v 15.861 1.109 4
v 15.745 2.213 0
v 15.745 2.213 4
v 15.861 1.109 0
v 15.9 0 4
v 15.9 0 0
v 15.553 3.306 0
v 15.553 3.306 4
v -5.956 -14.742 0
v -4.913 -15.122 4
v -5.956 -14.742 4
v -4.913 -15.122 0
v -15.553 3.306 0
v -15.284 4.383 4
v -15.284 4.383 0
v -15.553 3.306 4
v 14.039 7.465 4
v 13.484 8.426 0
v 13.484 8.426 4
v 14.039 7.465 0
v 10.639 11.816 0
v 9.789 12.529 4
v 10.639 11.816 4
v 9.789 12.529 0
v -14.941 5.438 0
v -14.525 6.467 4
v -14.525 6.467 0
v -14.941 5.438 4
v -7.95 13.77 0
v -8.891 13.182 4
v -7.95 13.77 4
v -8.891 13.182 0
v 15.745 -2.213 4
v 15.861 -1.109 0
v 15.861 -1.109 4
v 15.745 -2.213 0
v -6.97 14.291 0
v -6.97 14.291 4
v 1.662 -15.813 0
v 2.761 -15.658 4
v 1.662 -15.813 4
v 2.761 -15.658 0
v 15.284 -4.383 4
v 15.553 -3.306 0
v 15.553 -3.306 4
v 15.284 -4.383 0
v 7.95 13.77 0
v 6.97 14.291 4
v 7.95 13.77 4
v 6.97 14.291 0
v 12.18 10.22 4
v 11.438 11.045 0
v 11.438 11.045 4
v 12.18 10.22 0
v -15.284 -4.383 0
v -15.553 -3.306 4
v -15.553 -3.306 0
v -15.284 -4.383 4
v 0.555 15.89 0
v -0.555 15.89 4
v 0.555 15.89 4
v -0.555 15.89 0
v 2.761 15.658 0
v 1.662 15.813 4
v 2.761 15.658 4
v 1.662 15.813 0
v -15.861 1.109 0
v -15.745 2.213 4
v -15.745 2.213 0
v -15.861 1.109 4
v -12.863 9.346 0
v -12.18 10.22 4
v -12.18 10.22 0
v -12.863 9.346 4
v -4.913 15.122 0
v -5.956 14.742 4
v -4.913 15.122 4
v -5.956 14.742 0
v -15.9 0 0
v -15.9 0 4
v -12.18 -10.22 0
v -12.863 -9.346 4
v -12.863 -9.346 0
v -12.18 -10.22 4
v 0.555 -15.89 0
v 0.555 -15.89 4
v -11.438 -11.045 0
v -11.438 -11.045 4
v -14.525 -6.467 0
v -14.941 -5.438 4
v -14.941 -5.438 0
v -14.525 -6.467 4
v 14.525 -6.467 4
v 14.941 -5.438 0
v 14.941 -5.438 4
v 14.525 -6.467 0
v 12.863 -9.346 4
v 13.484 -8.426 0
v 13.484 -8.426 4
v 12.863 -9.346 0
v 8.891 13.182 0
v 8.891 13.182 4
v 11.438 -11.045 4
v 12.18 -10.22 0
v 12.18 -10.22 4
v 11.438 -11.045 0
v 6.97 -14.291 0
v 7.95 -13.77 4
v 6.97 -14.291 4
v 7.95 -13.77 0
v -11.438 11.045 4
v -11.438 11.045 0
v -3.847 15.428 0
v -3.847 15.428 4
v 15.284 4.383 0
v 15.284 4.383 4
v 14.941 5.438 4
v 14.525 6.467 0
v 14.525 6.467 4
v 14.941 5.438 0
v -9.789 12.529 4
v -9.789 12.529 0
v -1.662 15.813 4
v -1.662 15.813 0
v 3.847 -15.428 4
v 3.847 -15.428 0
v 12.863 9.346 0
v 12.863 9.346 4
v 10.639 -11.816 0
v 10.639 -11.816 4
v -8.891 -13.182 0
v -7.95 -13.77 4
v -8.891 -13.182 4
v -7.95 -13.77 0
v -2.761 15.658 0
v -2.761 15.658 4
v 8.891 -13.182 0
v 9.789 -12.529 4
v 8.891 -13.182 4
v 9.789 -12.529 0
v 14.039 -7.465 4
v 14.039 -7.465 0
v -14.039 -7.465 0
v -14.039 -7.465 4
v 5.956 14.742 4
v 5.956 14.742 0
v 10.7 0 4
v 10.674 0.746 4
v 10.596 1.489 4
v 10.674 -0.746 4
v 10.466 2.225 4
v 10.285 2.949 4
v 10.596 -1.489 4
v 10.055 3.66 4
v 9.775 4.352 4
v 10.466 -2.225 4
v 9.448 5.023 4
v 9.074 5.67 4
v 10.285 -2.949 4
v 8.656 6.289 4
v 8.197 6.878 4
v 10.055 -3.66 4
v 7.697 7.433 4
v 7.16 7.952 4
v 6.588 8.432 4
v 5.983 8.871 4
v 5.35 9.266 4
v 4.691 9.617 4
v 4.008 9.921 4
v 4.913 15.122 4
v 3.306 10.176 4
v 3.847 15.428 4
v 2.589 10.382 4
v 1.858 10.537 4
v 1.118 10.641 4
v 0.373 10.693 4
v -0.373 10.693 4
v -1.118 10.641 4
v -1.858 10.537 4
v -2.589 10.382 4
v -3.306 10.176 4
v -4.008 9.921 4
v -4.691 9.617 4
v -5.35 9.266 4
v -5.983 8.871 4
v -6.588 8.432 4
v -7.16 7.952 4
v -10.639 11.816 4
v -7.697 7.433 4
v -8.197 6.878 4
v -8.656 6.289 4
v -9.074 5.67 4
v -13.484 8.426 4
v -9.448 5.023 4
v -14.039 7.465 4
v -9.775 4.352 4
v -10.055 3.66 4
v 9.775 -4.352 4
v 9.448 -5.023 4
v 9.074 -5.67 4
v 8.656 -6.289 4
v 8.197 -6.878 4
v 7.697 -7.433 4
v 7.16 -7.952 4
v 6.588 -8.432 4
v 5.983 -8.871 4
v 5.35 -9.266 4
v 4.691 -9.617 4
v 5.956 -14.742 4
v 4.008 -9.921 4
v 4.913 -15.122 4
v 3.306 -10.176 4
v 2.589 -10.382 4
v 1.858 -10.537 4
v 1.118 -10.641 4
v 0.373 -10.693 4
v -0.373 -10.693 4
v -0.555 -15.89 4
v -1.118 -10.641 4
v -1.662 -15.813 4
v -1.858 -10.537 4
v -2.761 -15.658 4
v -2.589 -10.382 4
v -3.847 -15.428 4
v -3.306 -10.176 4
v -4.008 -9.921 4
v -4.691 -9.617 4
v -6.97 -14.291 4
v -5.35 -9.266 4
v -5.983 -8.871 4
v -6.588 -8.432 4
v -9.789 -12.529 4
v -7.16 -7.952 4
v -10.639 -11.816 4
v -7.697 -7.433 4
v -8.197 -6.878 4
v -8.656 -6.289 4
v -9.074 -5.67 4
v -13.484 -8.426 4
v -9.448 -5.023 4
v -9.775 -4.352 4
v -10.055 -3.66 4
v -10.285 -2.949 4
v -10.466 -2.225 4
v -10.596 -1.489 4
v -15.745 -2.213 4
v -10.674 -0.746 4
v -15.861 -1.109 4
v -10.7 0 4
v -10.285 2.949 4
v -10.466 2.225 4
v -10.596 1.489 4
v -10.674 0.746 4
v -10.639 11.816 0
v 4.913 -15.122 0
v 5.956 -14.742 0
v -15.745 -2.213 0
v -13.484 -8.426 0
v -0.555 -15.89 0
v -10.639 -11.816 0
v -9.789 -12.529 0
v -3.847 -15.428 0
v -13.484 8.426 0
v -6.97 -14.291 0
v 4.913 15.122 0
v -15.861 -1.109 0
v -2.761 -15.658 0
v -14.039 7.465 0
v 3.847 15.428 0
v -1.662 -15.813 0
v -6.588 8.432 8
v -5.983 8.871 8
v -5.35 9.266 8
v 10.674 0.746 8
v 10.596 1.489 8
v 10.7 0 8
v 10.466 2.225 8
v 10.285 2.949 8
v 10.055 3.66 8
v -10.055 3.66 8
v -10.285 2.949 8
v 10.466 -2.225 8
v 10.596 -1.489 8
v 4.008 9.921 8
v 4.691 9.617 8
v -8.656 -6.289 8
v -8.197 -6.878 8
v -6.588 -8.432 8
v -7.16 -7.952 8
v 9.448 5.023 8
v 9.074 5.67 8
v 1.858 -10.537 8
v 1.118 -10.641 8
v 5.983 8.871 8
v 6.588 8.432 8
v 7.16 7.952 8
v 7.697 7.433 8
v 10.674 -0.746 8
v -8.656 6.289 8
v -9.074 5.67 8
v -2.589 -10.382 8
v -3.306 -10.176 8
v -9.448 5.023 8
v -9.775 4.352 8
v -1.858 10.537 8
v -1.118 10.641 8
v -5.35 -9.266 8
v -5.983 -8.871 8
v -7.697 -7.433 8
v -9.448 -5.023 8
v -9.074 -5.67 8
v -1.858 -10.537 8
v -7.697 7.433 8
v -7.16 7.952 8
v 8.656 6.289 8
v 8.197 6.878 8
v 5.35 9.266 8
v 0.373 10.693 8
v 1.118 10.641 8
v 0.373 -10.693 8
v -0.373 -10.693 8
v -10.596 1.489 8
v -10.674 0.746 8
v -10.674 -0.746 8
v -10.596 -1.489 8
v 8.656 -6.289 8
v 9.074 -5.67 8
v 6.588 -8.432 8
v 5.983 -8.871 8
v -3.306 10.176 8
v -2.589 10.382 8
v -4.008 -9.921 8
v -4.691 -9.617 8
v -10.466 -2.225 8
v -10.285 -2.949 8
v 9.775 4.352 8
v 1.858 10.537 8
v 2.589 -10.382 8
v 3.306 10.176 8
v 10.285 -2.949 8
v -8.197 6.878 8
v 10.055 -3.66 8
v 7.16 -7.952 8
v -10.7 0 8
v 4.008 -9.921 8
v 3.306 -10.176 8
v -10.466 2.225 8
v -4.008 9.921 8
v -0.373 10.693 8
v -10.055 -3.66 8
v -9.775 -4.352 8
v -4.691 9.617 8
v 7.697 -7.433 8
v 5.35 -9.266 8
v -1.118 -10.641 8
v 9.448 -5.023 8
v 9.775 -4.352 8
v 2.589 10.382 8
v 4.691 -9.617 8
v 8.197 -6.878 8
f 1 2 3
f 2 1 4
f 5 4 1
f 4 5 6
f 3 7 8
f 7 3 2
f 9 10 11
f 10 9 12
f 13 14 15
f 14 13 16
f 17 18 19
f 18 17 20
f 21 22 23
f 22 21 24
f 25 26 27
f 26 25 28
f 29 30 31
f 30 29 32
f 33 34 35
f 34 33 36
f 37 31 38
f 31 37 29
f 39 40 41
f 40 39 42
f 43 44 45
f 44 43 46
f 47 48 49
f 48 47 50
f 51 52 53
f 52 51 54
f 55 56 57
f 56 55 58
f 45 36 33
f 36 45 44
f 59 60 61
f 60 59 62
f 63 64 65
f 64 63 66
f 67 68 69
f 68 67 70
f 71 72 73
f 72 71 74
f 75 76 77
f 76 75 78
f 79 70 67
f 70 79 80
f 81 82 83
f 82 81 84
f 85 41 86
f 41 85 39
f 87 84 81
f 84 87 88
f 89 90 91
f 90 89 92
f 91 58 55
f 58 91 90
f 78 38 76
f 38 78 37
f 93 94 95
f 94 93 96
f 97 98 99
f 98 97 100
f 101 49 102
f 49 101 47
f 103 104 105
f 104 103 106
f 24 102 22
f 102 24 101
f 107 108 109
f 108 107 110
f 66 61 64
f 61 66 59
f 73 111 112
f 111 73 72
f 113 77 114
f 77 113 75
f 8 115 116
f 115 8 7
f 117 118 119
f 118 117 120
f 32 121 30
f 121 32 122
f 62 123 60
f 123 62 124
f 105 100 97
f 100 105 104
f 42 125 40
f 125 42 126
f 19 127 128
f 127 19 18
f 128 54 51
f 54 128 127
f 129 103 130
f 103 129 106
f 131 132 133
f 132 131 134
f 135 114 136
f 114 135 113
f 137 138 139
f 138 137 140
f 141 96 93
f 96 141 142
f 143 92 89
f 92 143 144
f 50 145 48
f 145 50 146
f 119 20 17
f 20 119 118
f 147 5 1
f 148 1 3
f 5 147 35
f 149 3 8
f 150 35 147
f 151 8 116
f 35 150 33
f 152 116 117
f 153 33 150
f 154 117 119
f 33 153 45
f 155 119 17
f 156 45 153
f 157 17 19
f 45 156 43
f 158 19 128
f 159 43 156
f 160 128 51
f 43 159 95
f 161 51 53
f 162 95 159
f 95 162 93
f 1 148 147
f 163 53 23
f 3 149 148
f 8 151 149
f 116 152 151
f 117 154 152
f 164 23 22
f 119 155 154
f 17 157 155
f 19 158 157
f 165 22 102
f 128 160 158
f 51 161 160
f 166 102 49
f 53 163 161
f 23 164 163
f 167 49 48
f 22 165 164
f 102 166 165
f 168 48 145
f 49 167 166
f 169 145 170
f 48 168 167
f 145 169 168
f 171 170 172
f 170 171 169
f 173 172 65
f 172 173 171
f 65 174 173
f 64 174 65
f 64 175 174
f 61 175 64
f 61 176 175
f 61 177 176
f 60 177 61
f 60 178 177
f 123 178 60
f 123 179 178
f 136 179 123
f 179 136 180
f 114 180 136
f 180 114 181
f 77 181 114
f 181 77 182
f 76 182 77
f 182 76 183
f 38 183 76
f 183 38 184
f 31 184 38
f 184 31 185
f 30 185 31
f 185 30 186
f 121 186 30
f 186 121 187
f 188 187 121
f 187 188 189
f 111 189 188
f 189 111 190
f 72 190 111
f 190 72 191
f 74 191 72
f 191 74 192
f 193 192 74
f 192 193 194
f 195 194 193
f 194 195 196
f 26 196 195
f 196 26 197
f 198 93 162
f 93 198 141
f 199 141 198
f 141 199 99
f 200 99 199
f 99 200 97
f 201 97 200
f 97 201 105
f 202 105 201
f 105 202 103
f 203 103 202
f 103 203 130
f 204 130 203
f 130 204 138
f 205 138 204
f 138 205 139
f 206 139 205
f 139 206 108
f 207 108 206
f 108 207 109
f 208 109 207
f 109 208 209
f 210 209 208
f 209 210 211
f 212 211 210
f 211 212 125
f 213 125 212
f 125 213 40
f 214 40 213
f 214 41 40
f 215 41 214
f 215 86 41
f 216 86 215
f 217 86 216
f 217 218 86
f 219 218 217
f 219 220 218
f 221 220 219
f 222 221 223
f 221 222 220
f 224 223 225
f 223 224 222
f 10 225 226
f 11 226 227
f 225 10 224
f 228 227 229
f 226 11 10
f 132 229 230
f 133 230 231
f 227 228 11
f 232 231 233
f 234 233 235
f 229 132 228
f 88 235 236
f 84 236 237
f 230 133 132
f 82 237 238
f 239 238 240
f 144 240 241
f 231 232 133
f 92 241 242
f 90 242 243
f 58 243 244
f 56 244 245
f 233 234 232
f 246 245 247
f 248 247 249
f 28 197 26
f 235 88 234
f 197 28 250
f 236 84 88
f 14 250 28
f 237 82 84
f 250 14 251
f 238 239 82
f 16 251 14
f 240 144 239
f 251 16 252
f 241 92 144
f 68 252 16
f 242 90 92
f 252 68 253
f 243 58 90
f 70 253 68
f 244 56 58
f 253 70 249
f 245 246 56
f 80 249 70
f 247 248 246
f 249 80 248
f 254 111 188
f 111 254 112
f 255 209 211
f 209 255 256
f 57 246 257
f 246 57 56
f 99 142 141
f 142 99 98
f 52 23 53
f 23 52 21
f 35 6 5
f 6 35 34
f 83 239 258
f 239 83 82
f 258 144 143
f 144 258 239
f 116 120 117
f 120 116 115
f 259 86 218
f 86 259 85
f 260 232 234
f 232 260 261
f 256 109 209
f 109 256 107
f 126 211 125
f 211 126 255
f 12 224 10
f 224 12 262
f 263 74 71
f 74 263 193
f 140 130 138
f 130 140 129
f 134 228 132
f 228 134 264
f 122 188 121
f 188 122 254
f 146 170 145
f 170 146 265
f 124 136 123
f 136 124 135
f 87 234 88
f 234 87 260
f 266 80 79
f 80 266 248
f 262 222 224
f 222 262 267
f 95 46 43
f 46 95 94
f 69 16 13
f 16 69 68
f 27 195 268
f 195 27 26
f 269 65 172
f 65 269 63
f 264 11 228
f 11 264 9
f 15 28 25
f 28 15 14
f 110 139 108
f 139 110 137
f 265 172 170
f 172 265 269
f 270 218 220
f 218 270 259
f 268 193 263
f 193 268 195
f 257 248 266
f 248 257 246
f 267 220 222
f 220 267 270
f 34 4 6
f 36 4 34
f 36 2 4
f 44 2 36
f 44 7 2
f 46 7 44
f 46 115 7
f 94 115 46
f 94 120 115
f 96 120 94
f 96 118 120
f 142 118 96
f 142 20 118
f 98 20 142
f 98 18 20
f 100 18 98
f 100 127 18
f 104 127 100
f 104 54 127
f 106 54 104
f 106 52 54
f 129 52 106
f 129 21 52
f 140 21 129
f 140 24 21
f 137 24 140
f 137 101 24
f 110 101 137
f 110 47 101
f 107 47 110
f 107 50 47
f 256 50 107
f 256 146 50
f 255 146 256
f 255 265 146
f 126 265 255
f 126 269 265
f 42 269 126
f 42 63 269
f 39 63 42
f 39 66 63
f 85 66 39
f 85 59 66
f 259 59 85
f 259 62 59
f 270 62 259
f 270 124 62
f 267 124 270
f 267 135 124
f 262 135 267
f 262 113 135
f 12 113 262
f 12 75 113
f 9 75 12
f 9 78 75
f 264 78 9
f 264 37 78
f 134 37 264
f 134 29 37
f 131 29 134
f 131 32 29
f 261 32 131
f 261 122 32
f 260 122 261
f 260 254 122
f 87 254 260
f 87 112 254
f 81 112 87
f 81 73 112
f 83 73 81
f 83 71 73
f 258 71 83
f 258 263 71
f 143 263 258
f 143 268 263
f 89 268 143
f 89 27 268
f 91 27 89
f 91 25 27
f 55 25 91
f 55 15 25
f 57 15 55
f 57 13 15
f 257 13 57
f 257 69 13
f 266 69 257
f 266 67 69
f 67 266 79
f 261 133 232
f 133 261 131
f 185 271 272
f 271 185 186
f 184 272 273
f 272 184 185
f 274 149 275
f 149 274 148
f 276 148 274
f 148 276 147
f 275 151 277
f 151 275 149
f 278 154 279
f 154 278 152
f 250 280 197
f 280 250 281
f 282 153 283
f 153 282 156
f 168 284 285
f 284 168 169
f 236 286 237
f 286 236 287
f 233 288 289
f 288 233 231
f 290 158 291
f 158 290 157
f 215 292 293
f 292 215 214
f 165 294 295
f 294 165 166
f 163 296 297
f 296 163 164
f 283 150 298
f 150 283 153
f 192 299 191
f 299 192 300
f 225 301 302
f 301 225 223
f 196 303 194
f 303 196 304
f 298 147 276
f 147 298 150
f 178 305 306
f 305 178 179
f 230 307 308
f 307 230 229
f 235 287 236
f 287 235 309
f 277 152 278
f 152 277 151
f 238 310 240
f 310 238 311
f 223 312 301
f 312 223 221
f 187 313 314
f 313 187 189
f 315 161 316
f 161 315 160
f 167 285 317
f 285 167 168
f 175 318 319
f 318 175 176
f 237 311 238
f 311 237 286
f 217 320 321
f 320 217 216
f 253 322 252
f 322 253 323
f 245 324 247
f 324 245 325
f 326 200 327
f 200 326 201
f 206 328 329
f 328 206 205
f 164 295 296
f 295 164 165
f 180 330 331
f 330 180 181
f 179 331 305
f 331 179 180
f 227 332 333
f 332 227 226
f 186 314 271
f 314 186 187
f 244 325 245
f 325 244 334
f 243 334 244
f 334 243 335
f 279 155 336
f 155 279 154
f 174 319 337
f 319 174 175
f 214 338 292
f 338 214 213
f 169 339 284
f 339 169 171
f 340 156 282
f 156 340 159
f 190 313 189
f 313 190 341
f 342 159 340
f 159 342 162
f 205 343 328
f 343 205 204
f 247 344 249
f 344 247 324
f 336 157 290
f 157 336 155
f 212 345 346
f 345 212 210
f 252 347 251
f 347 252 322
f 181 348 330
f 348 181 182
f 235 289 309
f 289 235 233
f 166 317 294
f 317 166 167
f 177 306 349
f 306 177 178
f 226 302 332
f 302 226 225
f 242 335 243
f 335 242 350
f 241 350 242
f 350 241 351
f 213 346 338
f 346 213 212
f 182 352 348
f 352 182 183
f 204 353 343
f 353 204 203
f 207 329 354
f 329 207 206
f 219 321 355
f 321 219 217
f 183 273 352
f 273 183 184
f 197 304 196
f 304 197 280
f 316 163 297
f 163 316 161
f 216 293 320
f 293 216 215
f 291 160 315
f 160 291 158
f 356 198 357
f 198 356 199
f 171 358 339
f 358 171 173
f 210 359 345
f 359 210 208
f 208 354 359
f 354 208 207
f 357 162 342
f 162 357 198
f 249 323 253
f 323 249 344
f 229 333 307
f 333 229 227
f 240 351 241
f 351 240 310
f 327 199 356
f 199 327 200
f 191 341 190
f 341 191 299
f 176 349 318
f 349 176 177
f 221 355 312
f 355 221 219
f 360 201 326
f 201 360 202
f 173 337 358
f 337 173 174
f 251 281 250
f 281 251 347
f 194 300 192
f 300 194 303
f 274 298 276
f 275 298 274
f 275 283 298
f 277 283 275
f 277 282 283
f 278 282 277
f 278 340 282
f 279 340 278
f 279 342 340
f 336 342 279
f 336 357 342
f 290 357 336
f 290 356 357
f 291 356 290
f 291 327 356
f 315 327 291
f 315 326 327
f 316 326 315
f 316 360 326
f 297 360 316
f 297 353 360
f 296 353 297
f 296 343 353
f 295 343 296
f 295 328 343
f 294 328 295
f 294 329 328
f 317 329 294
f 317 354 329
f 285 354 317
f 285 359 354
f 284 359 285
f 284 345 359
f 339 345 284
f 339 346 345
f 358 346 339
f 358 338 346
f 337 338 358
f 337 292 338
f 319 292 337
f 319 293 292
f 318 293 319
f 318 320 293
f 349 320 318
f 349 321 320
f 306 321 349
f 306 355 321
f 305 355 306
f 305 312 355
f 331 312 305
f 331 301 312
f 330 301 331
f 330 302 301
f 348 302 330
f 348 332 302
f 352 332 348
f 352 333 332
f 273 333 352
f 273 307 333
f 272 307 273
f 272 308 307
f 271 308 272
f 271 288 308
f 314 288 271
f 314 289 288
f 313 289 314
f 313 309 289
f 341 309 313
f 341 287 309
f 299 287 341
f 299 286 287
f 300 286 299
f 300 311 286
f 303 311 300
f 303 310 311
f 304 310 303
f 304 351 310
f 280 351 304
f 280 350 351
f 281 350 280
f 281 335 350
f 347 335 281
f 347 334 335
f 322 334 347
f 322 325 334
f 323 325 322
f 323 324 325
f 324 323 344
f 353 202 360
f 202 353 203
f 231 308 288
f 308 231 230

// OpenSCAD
$fn = 90;

D_OUTER = 31.8;
D_INNER = 25.4;

cylinder(d=D_OUTER, h=4);
cylinder(d=D_INNER-4, h=8);
